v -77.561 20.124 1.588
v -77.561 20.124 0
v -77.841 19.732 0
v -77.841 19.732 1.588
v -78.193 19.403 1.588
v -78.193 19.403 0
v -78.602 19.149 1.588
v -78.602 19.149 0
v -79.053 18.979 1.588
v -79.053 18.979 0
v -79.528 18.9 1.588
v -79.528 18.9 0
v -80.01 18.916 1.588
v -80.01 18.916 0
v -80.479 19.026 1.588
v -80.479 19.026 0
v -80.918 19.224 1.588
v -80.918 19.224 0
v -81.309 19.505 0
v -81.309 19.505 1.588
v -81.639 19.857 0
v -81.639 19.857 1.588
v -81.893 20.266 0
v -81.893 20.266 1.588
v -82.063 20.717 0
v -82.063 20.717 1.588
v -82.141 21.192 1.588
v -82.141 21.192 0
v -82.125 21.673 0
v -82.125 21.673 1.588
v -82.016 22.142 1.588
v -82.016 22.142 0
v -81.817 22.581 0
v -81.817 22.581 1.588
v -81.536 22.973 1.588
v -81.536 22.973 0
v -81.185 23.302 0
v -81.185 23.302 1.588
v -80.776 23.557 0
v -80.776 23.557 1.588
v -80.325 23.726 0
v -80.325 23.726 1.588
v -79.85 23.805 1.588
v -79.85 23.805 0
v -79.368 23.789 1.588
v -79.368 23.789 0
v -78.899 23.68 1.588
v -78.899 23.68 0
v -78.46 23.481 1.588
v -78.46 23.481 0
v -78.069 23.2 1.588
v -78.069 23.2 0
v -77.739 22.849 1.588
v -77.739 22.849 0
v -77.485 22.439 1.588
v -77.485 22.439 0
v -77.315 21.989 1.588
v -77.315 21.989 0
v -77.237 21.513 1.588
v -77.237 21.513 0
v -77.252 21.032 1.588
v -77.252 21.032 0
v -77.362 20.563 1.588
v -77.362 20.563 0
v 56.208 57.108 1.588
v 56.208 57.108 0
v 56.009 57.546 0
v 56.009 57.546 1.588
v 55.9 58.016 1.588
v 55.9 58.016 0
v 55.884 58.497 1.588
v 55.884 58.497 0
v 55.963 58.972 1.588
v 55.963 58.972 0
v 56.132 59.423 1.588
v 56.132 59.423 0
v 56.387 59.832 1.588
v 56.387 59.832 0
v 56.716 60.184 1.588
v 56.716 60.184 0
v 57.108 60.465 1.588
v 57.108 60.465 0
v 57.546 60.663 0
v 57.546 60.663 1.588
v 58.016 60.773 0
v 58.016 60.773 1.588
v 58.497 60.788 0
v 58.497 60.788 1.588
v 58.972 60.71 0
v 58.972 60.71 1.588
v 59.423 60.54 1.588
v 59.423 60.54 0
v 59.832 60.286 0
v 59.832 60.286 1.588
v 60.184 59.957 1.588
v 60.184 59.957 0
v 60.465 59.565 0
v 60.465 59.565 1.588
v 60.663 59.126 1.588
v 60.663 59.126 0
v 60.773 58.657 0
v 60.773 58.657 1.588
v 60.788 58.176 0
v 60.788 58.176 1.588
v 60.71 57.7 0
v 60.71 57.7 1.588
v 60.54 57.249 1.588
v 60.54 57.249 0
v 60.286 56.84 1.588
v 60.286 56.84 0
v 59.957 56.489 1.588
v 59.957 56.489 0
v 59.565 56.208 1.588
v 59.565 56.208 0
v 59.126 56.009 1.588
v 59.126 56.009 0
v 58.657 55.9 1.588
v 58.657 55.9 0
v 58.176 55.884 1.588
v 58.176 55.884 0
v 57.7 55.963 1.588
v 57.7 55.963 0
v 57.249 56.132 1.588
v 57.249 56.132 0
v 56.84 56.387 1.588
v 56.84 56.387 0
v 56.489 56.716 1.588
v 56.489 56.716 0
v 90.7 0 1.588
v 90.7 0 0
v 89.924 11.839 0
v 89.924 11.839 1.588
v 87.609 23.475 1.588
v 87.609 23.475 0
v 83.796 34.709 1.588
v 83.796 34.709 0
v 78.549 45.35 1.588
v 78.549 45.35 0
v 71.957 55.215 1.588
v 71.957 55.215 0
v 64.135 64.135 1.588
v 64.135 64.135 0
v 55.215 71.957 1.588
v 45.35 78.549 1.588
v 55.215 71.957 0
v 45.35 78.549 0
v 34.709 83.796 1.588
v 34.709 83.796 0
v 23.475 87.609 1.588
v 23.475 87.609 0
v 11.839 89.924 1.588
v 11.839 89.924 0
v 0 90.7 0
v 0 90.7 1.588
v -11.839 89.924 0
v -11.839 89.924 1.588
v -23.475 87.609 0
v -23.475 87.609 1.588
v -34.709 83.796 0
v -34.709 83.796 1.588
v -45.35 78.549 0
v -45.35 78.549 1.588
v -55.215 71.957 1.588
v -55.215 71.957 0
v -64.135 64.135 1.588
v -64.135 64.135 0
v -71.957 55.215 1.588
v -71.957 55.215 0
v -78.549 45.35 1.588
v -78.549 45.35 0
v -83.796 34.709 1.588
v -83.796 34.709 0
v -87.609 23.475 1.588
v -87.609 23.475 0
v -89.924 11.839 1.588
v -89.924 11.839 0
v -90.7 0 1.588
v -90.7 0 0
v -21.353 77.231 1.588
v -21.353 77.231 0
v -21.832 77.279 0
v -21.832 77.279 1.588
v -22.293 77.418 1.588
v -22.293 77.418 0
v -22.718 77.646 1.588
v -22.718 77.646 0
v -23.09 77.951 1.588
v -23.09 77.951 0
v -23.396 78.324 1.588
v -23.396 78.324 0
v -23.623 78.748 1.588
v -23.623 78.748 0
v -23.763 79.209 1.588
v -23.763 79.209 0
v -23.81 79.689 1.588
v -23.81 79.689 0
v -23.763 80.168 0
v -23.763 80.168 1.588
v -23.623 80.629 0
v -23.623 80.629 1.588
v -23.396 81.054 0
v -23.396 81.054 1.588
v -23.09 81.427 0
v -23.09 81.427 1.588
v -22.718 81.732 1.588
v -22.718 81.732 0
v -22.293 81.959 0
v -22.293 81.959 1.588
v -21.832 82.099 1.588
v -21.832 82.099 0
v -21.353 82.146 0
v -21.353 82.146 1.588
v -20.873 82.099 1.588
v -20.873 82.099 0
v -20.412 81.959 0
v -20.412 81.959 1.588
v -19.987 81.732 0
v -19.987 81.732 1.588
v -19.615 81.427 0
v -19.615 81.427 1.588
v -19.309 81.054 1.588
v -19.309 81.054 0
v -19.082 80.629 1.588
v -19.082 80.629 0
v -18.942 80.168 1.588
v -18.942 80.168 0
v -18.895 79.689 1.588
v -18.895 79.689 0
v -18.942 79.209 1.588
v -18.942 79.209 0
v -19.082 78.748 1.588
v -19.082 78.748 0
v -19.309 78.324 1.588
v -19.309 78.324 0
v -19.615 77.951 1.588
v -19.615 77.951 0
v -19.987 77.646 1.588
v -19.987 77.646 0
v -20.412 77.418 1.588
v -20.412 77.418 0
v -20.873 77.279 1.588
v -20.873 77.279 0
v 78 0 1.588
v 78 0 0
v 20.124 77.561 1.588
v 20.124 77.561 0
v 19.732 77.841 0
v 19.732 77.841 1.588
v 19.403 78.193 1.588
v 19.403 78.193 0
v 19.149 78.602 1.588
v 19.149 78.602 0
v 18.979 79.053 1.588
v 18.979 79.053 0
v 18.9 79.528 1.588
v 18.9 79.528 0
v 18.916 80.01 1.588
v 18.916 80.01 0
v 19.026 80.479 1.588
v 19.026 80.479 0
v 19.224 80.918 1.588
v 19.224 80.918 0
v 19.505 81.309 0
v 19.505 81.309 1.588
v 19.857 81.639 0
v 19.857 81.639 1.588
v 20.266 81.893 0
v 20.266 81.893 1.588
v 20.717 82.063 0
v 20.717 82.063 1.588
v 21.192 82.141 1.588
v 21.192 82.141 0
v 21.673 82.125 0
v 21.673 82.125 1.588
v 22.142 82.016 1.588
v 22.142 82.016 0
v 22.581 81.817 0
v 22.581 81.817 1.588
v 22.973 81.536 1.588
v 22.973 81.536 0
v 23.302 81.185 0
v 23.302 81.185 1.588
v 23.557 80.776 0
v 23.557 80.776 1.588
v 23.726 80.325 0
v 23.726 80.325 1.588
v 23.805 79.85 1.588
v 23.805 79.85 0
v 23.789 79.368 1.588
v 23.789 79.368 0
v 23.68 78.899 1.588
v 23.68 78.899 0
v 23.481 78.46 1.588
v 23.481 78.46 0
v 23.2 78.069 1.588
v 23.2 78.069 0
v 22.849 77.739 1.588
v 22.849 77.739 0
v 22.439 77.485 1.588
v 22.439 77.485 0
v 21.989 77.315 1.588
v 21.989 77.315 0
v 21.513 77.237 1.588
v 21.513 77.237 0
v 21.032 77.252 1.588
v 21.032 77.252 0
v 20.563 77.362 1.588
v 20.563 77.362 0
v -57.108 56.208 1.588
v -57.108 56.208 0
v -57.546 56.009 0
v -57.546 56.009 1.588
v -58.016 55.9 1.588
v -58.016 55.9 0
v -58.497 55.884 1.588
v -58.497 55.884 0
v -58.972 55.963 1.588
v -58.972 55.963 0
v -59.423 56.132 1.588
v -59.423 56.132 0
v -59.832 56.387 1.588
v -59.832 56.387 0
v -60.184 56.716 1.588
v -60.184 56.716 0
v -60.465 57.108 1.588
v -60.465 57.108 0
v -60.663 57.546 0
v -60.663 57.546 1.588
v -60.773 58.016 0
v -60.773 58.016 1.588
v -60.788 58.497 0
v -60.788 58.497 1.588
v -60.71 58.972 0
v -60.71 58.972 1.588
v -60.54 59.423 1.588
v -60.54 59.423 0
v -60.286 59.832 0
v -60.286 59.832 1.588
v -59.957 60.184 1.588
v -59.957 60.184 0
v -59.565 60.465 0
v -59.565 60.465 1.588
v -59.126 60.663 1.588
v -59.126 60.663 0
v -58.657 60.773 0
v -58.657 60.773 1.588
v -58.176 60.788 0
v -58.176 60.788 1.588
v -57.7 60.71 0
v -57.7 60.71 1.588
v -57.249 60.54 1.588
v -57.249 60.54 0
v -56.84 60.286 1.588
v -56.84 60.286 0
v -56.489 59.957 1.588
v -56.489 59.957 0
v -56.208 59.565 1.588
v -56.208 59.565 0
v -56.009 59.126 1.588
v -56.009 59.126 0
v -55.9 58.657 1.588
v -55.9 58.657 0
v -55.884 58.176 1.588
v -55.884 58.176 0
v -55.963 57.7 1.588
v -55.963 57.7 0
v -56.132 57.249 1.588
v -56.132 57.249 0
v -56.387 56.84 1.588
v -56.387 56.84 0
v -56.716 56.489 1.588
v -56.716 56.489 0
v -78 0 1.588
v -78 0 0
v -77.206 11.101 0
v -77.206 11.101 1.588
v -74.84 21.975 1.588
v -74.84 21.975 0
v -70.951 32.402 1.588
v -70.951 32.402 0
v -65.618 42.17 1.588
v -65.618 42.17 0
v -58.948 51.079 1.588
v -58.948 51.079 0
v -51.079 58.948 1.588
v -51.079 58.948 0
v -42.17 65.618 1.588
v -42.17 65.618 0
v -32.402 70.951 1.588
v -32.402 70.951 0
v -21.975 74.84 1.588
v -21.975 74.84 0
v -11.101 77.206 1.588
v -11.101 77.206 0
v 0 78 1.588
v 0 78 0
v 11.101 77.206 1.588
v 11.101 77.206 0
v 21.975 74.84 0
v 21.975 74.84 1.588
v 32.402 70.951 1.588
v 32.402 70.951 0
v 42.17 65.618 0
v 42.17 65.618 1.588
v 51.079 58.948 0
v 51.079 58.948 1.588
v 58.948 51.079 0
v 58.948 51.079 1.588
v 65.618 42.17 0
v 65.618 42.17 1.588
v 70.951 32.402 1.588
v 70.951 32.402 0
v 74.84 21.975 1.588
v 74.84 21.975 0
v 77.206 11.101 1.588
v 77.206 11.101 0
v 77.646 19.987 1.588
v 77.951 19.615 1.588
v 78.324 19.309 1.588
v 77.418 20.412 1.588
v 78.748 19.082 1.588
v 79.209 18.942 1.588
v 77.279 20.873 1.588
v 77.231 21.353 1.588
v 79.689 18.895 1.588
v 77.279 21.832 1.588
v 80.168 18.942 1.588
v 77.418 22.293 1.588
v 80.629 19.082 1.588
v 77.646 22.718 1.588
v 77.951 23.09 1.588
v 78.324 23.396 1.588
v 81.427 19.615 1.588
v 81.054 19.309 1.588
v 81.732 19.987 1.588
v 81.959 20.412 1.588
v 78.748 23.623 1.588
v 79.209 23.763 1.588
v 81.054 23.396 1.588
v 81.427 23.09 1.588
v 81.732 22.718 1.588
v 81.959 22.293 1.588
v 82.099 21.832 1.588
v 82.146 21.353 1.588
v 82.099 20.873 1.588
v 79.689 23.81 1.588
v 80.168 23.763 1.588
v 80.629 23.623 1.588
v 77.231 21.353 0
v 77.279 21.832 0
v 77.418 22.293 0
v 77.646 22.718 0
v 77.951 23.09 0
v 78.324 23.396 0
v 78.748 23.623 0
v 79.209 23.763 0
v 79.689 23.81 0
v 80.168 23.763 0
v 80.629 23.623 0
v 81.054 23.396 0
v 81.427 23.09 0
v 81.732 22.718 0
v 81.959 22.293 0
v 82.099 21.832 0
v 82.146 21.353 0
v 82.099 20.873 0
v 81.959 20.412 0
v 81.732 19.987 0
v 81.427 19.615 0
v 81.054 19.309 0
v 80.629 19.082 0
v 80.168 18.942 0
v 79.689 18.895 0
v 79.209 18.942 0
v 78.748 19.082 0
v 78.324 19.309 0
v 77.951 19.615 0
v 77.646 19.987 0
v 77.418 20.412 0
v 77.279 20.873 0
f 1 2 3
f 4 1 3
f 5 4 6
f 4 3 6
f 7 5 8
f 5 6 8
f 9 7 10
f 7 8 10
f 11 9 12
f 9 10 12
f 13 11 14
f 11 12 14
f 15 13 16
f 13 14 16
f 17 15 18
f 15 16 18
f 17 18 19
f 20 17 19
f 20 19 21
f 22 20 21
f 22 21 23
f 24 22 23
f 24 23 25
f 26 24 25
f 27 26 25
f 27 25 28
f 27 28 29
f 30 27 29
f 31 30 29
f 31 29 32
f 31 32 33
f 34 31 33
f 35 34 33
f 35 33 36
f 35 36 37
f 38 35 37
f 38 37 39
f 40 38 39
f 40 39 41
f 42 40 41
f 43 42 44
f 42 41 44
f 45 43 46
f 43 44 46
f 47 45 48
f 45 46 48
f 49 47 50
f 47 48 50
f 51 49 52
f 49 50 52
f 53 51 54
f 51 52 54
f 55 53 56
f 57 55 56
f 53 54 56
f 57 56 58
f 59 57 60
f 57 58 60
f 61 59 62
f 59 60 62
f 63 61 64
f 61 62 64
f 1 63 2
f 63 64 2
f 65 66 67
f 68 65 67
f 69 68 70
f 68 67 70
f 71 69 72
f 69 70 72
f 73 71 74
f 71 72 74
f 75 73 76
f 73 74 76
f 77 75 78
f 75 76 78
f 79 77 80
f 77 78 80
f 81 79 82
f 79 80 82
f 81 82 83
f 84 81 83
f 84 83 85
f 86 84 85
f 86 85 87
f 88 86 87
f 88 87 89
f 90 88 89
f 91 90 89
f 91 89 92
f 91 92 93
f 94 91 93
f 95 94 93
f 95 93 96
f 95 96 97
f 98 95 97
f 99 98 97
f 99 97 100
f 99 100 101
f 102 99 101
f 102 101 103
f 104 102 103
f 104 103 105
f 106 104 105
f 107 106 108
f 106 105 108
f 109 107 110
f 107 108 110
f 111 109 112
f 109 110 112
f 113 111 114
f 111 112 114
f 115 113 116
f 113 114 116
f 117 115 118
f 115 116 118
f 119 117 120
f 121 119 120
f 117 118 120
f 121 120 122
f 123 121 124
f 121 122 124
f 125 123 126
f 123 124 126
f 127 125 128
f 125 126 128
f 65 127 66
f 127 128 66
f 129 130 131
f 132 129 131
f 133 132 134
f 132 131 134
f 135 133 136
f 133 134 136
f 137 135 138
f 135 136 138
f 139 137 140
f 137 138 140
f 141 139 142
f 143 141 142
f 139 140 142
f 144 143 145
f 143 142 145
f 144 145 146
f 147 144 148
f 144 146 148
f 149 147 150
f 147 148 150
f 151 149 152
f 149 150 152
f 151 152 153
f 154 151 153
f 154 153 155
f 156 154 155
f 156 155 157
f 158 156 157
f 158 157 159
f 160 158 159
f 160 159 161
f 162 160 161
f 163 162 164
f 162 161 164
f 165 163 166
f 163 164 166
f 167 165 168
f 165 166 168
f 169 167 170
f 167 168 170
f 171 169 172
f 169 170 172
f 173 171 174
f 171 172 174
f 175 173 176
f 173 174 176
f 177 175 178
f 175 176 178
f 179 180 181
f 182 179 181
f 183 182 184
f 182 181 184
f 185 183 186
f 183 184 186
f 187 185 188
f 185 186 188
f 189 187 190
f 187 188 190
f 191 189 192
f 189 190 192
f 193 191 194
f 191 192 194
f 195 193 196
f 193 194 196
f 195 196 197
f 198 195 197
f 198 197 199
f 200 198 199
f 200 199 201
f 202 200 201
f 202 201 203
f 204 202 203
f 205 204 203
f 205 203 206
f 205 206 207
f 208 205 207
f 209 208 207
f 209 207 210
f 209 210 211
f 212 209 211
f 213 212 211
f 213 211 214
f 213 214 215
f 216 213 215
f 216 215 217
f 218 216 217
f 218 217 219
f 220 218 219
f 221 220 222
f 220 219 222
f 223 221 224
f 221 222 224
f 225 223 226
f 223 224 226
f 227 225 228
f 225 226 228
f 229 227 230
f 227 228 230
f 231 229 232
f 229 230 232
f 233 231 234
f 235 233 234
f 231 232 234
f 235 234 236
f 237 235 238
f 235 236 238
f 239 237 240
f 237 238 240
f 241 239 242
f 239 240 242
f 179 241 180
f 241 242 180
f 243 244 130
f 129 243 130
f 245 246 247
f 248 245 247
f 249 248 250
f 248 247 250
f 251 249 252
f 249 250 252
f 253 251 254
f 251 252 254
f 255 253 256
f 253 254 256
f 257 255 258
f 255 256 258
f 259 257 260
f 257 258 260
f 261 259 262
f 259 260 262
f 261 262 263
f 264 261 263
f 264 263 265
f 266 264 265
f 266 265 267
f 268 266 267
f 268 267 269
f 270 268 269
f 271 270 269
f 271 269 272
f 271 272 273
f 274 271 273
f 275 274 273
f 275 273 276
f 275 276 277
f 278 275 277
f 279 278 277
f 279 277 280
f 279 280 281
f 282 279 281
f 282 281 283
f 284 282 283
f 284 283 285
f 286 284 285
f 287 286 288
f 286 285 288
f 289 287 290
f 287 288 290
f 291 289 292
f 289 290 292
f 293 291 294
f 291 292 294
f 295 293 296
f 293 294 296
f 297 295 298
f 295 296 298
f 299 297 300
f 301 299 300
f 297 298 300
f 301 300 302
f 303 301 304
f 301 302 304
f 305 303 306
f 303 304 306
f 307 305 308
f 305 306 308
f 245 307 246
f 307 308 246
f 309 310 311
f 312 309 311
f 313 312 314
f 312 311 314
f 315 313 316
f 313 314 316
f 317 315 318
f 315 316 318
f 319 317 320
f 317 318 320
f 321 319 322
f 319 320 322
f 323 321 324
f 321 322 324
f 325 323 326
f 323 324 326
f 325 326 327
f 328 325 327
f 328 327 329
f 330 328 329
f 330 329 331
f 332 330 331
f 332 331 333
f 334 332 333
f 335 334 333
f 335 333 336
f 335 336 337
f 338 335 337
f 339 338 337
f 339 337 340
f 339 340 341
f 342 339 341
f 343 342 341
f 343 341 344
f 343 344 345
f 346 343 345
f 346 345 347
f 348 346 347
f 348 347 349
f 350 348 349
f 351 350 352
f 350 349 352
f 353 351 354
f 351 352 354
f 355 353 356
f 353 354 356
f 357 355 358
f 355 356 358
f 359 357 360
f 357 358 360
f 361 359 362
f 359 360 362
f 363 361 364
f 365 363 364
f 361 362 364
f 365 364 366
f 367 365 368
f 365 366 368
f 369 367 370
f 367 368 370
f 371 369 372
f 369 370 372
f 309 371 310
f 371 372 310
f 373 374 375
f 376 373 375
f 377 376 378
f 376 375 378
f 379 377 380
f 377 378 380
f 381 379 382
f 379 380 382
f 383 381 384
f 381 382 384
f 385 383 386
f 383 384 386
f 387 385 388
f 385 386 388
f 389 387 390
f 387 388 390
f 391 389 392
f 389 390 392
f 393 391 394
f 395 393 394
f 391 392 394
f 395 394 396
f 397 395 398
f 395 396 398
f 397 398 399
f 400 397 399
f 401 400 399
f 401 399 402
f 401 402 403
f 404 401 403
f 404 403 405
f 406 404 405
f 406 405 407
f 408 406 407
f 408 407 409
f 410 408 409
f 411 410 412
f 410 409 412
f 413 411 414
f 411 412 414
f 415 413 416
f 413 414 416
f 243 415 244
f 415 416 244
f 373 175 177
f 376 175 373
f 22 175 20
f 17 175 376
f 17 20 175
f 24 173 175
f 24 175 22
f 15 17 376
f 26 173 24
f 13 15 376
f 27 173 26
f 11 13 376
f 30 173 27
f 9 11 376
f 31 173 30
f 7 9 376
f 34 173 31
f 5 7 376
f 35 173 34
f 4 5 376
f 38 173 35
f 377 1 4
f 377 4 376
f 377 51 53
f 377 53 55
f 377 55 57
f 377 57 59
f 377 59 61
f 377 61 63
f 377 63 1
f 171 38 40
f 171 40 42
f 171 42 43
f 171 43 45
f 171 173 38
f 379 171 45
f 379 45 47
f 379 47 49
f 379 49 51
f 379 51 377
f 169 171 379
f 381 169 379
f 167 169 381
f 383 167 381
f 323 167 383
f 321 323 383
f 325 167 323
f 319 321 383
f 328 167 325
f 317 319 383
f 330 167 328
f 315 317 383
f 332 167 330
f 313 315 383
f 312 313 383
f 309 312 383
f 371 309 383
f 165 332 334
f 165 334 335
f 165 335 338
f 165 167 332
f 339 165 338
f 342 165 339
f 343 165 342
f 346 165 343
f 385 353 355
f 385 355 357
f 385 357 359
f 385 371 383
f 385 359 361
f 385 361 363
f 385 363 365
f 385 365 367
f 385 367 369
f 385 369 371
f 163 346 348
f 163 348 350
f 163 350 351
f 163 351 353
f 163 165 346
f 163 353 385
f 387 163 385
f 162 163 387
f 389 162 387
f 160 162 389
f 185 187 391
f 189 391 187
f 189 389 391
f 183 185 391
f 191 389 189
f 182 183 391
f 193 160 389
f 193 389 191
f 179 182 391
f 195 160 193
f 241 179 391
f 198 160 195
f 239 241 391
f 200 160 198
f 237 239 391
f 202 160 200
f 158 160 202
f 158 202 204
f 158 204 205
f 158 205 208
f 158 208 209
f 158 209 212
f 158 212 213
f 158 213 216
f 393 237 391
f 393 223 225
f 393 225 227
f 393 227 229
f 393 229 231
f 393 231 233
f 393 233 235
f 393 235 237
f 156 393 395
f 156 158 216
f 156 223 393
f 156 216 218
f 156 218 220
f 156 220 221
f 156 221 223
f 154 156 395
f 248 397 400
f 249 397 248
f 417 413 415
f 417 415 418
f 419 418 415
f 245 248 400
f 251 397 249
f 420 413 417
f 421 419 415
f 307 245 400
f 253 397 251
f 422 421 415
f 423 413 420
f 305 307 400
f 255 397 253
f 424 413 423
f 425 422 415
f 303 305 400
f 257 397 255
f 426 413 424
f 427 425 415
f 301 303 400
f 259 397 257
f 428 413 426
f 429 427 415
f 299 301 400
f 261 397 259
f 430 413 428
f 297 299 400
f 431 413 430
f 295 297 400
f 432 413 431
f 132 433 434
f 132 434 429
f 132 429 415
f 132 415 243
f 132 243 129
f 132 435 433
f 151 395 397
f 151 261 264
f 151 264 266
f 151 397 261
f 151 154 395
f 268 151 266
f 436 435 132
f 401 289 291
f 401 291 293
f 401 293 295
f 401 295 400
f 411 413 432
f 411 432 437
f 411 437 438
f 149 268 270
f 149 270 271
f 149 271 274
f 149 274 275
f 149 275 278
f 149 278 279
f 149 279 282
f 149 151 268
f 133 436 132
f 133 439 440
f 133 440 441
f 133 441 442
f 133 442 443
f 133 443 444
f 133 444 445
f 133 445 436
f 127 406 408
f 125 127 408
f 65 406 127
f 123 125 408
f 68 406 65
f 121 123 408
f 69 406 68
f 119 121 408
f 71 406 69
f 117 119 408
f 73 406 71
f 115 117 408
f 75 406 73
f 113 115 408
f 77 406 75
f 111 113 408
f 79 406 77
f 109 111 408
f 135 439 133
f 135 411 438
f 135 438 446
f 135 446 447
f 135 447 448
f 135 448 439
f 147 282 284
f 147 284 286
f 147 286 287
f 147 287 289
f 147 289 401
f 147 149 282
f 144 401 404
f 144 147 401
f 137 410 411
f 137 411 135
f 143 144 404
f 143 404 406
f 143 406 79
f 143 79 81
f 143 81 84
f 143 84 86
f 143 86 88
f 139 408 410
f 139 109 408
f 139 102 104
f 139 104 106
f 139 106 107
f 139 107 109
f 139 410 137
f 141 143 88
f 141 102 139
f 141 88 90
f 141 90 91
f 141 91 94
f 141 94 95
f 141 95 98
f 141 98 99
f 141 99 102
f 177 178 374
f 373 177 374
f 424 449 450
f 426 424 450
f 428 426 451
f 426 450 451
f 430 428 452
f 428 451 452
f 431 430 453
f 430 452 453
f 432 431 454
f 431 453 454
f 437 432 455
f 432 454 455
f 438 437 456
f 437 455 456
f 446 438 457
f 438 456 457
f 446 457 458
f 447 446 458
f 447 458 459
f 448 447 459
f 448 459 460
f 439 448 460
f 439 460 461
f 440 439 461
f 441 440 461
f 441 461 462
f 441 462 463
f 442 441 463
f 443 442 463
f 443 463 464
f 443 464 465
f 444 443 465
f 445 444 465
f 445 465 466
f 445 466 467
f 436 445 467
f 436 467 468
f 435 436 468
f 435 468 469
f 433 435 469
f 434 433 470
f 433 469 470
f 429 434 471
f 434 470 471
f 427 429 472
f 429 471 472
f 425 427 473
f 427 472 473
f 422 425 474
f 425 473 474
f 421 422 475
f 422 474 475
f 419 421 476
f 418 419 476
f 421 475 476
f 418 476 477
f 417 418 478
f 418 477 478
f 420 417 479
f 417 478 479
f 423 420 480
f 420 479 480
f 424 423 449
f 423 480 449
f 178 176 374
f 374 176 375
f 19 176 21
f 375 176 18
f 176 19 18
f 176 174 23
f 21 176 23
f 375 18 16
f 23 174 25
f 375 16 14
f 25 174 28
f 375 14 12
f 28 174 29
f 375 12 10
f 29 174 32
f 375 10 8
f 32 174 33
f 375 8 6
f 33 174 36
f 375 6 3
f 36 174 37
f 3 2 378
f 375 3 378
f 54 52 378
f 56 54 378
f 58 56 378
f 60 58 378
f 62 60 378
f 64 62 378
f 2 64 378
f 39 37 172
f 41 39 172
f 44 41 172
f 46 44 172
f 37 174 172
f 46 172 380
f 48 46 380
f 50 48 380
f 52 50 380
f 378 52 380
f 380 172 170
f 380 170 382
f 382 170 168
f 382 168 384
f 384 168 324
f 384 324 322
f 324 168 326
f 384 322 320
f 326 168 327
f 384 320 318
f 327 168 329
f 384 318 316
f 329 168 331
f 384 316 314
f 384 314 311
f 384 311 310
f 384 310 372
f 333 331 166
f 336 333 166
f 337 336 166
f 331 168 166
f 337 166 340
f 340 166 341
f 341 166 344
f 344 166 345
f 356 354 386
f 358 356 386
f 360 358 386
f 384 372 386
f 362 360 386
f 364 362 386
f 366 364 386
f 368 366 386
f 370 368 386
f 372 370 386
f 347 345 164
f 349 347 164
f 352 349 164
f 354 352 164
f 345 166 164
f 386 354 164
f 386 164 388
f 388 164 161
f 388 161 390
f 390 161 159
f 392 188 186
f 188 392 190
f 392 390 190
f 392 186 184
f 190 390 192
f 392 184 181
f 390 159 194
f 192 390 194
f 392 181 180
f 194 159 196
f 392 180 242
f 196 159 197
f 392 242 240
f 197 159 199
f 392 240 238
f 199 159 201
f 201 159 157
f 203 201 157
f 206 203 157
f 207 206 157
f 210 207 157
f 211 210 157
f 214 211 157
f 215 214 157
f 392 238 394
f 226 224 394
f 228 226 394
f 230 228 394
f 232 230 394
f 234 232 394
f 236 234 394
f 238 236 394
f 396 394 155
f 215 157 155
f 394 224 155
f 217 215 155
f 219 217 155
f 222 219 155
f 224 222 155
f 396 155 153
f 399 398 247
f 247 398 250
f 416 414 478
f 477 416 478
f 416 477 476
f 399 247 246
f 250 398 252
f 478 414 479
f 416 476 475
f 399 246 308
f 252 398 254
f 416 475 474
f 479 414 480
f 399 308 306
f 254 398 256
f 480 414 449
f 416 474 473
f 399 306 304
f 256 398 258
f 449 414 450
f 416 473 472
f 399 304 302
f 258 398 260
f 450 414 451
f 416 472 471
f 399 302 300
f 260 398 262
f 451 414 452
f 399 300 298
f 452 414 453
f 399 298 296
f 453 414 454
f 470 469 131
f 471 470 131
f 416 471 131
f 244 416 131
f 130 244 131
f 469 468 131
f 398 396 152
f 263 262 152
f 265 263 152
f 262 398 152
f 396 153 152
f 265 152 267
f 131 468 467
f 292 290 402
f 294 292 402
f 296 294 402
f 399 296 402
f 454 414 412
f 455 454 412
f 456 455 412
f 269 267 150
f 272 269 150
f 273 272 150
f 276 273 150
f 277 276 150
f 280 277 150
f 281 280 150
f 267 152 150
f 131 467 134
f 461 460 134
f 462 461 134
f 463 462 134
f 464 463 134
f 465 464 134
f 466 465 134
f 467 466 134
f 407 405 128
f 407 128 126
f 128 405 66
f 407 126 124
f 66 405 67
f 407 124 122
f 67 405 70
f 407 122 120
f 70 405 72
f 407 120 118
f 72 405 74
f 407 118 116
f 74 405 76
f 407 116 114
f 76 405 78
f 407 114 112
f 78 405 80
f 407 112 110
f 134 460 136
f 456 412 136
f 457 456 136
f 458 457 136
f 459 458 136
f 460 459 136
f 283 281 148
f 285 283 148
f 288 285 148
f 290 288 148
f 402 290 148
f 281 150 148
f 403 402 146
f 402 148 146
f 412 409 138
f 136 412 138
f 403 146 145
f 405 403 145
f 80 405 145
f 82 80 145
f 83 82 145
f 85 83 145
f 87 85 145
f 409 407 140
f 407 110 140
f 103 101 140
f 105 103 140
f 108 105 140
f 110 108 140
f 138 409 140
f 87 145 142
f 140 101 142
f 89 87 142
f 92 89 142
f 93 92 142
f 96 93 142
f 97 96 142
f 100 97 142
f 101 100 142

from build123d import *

# Parameters (mm, degrees)
BOSS_EXTRUDE1_DEPTH   = 1.5875
F_8_CLEARANCE_HOLE1_D = 4.9149
CIRPATTERN1_COUNT     = 6
CIRPATTERN1_ANGLE     = 150


with BuildPart() as part:
    # Sketch1 → Boss-Extrude1 (new body)
    with BuildSketch(Plane.XY):
        with BuildLine():
            Line((-90.7, 0), (-78, 0))
            ThreePointArc((-78, 0), (0, 78), (78, 0))
            Line((78, 0), (90.7, 0))
            ThreePointArc((90.7, 0), (0, 90.7), (-90.7, 0))
        make_face()
    extrude(amount=BOSS_EXTRUDE1_DEPTH)

    # #8 Clearance Hole1 (through all)
    with Locations(Plane.XY.offset(1.5875)):
        with Locations((79.688880669, 21.352571221)):
            f_8_clearance_hole1 = Hole(F_8_CLEARANCE_HOLE1_D / 2)

    # CirPattern1: #8 Clearance Hole1 ×6 about axis
    cirpattern1_axis = Axis((0, 0, 0), (0, 0, 1))
    for i in range(1, CIRPATTERN1_COUNT):
        add(f_8_clearance_hole1.rotate(cirpattern1_axis, i * CIRPATTERN1_ANGLE / (CIRPATTERN1_COUNT - 1)), mode=Mode.SUBTRACT)


solid = part.part
